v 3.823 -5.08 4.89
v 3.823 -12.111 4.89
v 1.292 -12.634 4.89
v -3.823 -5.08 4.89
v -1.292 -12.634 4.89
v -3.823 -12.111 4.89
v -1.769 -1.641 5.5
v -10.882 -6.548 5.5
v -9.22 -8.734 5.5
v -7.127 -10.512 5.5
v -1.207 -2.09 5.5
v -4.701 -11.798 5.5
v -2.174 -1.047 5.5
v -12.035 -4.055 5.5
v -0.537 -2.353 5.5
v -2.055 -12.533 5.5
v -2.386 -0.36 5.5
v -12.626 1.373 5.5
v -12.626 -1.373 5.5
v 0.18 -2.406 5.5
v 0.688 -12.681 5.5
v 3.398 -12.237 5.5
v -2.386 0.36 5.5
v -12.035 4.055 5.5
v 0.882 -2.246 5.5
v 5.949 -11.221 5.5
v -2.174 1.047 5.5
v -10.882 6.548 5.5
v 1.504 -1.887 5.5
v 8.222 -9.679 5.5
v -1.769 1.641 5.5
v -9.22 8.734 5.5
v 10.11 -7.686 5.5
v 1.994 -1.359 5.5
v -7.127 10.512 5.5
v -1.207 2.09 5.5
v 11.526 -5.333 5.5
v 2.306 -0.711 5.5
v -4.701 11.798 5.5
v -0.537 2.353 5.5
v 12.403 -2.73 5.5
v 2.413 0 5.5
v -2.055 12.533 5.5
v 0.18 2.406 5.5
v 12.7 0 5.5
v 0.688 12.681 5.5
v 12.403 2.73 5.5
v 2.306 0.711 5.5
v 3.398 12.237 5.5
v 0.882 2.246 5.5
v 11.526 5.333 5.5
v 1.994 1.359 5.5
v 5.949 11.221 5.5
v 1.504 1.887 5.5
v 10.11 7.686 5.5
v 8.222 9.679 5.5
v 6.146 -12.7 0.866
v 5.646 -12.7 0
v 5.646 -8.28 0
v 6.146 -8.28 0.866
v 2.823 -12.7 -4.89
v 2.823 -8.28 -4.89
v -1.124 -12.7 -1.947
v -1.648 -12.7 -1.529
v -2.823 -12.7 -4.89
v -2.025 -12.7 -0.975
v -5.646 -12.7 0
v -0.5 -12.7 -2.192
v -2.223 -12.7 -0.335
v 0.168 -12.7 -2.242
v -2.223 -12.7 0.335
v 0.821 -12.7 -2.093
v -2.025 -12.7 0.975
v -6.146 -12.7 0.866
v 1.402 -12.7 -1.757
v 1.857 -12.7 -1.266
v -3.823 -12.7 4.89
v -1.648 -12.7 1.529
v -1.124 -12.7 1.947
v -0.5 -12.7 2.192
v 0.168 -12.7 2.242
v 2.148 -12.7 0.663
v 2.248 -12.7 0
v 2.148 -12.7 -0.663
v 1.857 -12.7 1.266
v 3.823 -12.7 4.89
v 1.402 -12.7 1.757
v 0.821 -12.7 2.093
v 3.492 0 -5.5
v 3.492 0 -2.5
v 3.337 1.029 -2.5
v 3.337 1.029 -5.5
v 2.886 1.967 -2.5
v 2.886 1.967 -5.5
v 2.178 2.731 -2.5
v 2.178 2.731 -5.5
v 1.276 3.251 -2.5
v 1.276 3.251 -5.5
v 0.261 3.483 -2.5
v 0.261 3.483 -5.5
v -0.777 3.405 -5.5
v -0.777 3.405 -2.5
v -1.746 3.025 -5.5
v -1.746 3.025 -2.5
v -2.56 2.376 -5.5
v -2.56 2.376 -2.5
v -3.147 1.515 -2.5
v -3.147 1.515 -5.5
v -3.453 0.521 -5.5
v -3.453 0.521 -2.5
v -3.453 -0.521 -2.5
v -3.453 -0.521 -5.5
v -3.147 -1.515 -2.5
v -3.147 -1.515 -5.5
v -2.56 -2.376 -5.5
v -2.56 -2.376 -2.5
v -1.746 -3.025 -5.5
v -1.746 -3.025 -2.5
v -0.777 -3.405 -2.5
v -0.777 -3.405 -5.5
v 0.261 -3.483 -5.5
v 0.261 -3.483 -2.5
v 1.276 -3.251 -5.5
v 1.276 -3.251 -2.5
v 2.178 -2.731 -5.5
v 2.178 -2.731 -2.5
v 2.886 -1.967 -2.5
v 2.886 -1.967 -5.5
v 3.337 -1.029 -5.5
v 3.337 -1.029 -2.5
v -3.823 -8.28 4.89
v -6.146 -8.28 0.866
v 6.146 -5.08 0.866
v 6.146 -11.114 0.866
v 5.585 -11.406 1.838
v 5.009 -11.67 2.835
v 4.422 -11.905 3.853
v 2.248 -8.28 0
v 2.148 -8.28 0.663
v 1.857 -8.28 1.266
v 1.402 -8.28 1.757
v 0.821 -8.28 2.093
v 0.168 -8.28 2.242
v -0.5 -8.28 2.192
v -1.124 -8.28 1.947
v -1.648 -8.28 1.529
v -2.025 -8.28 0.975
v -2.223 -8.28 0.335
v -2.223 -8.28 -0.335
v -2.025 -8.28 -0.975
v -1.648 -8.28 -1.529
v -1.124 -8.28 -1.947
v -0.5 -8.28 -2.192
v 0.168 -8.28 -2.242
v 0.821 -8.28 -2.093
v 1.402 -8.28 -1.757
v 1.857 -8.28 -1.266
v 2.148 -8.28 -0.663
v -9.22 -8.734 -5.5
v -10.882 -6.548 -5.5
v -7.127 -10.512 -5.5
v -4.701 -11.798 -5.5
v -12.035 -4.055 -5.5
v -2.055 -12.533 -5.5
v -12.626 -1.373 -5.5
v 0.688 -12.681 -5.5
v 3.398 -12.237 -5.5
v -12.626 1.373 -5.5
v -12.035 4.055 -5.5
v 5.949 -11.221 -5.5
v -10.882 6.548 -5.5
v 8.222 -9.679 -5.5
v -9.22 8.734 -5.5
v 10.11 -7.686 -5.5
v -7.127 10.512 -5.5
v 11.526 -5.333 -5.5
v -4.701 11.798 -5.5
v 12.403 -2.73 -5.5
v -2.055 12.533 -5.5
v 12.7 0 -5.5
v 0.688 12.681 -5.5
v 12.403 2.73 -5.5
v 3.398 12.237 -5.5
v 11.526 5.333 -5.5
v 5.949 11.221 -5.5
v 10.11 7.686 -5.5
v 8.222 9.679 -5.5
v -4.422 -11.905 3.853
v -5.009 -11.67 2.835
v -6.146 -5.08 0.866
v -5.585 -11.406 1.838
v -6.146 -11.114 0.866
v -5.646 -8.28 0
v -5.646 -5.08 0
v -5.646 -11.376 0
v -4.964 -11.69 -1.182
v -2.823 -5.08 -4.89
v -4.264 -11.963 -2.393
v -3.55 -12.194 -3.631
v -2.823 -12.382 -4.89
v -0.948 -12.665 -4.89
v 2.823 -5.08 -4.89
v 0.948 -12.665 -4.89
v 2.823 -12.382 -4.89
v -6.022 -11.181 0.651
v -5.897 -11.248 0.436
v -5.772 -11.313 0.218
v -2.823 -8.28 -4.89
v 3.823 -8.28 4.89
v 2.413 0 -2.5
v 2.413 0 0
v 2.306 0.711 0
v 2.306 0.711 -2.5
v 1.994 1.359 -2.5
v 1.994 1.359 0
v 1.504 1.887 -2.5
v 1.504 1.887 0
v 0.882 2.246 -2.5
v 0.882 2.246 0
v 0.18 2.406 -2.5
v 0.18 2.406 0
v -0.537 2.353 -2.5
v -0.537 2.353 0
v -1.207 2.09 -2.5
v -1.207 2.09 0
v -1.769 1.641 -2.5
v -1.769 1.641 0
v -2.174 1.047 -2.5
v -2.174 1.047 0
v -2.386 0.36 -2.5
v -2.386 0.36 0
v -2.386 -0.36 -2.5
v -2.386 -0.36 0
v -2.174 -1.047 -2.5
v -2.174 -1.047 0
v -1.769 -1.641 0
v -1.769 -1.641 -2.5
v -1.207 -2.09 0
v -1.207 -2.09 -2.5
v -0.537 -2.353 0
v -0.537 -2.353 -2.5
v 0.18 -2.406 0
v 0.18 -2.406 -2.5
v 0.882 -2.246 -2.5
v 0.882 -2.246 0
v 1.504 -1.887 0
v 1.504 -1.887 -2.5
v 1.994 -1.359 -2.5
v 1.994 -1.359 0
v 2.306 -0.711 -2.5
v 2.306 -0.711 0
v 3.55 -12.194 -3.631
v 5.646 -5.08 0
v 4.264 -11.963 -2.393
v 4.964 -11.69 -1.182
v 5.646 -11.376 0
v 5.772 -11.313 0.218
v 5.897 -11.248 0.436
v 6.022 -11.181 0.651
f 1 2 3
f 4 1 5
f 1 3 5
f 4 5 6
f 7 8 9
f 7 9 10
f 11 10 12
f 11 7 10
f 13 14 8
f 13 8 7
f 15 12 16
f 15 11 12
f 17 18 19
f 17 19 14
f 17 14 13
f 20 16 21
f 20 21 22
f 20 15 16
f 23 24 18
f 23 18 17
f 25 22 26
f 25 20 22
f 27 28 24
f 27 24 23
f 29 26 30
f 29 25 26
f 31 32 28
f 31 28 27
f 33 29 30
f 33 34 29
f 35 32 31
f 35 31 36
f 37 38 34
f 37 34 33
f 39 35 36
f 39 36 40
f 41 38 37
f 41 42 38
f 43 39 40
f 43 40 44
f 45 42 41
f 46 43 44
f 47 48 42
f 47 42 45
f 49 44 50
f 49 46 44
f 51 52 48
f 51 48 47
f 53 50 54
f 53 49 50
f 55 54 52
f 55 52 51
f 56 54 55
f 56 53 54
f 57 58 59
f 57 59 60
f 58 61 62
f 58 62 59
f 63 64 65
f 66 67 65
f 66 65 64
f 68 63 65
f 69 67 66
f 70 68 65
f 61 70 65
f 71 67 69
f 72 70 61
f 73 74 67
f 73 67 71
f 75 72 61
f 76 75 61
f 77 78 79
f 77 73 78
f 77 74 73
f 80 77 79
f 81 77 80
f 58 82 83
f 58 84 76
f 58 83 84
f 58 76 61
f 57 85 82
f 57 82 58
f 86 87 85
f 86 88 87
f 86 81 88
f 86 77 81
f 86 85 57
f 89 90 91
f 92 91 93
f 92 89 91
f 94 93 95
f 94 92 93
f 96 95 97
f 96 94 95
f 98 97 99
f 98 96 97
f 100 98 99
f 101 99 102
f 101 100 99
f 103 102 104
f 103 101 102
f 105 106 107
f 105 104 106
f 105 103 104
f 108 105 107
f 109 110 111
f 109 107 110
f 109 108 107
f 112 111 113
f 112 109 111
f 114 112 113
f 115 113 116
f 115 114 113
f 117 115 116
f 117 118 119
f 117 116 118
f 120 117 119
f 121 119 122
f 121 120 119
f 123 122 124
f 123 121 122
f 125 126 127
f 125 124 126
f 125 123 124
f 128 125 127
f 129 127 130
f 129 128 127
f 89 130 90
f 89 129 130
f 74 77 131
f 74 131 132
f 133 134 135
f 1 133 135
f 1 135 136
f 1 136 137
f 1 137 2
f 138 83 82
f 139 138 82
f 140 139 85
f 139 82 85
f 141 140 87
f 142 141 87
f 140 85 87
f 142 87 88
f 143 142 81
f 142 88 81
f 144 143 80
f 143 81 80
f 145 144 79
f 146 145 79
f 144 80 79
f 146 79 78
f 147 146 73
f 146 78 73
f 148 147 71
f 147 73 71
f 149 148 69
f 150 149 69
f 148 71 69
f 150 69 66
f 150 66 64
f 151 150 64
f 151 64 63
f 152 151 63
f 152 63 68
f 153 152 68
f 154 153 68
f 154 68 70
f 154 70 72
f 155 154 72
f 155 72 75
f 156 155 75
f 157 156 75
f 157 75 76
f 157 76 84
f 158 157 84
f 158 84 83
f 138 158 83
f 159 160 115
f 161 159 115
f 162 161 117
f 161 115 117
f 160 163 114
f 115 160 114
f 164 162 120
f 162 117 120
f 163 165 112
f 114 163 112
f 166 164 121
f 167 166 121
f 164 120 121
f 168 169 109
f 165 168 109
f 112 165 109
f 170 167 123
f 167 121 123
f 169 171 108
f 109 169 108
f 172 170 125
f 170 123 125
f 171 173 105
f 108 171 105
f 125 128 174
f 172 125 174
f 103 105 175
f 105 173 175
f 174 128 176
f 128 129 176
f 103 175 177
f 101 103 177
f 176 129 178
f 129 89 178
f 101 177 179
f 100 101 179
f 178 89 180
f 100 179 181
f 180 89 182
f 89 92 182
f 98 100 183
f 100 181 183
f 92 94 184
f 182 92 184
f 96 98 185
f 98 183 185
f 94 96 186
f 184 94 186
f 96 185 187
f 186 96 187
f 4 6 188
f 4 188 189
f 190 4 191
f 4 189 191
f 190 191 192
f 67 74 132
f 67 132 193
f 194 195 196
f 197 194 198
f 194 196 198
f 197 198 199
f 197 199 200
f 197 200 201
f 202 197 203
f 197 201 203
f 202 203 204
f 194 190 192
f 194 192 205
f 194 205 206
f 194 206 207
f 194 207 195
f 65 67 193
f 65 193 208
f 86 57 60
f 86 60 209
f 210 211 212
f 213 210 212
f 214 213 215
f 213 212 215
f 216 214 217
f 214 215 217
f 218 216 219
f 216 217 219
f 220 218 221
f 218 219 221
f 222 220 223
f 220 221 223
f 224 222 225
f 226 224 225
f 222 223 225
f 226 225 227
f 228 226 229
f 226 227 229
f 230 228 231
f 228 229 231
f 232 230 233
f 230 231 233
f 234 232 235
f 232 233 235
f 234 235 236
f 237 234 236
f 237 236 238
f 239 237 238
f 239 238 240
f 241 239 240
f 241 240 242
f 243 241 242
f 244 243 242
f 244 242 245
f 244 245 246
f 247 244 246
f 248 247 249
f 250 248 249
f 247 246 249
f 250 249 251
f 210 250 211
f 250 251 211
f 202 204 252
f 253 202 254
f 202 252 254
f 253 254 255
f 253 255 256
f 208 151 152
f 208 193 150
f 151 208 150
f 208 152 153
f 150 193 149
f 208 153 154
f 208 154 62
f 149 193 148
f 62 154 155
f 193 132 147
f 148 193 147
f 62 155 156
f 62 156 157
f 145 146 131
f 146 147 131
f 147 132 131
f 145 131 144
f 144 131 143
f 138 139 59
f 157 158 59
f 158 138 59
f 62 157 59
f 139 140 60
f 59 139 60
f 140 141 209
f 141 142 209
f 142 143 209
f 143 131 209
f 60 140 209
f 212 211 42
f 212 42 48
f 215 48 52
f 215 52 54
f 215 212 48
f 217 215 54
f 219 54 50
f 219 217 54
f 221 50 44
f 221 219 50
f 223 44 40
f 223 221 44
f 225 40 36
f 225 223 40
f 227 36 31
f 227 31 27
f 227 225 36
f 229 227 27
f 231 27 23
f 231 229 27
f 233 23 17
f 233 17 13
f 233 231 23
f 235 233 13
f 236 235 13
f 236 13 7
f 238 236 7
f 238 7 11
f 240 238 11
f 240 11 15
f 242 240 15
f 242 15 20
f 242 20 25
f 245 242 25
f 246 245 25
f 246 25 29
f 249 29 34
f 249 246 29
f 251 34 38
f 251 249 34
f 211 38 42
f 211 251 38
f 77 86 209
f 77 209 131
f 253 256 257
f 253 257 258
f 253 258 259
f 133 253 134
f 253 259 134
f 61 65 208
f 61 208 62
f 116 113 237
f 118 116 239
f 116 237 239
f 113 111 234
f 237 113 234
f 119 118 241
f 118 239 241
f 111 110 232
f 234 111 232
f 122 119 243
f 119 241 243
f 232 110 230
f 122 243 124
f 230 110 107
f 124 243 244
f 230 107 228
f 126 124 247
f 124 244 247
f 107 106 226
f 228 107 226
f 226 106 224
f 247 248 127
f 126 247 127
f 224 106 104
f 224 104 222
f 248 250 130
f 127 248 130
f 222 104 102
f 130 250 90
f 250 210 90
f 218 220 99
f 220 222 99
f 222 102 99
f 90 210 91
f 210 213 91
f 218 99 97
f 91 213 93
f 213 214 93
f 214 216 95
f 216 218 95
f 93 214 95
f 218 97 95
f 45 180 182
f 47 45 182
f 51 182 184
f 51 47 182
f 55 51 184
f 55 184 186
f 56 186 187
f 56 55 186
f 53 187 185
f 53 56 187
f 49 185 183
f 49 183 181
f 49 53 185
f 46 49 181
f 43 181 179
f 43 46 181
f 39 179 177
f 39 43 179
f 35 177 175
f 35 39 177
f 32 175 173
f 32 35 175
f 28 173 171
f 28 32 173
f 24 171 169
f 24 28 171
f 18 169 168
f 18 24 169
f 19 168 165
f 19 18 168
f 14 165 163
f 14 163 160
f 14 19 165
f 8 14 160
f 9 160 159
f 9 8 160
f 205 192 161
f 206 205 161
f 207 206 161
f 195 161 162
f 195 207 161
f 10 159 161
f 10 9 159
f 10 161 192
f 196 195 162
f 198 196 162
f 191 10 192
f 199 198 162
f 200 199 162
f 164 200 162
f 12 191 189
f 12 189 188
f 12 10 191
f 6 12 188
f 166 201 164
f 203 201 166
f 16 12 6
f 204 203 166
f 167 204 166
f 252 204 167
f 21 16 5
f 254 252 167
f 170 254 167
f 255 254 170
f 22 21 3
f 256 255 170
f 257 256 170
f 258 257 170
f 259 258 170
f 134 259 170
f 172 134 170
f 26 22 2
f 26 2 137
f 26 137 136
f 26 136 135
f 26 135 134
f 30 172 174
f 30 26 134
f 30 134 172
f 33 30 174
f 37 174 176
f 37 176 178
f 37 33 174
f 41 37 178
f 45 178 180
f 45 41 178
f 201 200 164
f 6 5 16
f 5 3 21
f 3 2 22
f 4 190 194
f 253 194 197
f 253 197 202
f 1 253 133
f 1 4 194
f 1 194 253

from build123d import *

# Parameters (mm, degrees)
F0_R           = 12.7
F0_R_2         = 3.4925
F1_DEPTH       = 5.5
F3_R           = 2.2479
F4_DEPTH       = 7.62
F6_DEPTH       = 7.62
F7_DEPTH       = 4.42
F8_DEPTH       = 12.7
F9_R           = 4.1894842837
F9_R_2         = 2.413
F10_DEPTH      = 5.5
F10_DEPTH_BACK = 2.5


with BuildPart() as f1:
    # F0 (on Top) → F1 (new body, symmetric)
    with BuildSketch(Plane.XY):
        Circle(F0_R)
        Circle(F0_R_2, mode=Mode.SUBTRACT)
    extrude(amount=F1_DEPTH, both=True)

    # F3 (on offset) → F4 (cut)
    with BuildSketch(Plane.XZ.offset(12.7)):
        Circle(F3_R)
    extrude(amount=-F4_DEPTH, mode=Mode.SUBTRACT)

    # F5 (on offset) → F6 (cut)
    with BuildSketch(Plane.XZ.offset(12.7)):
        Polygon((-6.1459082824, 0.8660254038), (-5.6459082824, 0), (-2.8229541412, 4.8895), (-3.8229541412, 4.8895), align=None)
        Polygon((-2.8229541412, -4.8895), (2.8229541412, -4.8895), (5.6459082824, 0), (2.8229541412, 4.8895), (-2.8229541412, 4.8895), (-5.6459082824, 0), align=None)
        Polygon((2.8229541412, 4.8895), (5.6459082824, 0), (6.1459082824, 0.8660254038), (3.8229541412, 4.8895), align=None)
    extrude(amount=-F6_DEPTH, mode=Mode.SUBTRACT)

    # F9 (on Top) → F10 (join, two sides)
    with BuildSketch(Plane.XY) as f10_sk:
        Circle(F9_R)
        Circle(F9_R_2, mode=Mode.SUBTRACT)
    extrude(amount=F10_DEPTH)
    extrude(f10_sk.sketch, amount=-F10_DEPTH_BACK)


with BuildPart() as f7:
    # F5 (on offset) → F7 (new body)
    with BuildSketch(Plane.XZ.offset(12.7)):
        Polygon((-2.8229541412, -4.8895), (2.8229541412, -4.8895), (5.6459082824, 0), (2.8229541412, 4.8895), (-2.8229541412, 4.8895), (-5.6459082824, 0), align=None)
        Polygon((2.8229541412, 4.8895), (5.6459082824, 0), (6.1459082824, 0.8660254038), (3.8229541412, 4.8895), align=None)
        Polygon((-6.1459082824, 0.8660254038), (-5.6459082824, 0), (-2.8229541412, 4.8895), (-3.8229541412, 4.8895), align=None)
    extrude(amount=-F7_DEPTH)

    # F3 (on offset) → F8 (cut)
    with BuildSketch(Plane.XZ.offset(12.7)):
        Circle(F3_R)
    extrude(amount=-F8_DEPTH, mode=Mode.SUBTRACT)


solid = Compound([f1.part, f7.part])
